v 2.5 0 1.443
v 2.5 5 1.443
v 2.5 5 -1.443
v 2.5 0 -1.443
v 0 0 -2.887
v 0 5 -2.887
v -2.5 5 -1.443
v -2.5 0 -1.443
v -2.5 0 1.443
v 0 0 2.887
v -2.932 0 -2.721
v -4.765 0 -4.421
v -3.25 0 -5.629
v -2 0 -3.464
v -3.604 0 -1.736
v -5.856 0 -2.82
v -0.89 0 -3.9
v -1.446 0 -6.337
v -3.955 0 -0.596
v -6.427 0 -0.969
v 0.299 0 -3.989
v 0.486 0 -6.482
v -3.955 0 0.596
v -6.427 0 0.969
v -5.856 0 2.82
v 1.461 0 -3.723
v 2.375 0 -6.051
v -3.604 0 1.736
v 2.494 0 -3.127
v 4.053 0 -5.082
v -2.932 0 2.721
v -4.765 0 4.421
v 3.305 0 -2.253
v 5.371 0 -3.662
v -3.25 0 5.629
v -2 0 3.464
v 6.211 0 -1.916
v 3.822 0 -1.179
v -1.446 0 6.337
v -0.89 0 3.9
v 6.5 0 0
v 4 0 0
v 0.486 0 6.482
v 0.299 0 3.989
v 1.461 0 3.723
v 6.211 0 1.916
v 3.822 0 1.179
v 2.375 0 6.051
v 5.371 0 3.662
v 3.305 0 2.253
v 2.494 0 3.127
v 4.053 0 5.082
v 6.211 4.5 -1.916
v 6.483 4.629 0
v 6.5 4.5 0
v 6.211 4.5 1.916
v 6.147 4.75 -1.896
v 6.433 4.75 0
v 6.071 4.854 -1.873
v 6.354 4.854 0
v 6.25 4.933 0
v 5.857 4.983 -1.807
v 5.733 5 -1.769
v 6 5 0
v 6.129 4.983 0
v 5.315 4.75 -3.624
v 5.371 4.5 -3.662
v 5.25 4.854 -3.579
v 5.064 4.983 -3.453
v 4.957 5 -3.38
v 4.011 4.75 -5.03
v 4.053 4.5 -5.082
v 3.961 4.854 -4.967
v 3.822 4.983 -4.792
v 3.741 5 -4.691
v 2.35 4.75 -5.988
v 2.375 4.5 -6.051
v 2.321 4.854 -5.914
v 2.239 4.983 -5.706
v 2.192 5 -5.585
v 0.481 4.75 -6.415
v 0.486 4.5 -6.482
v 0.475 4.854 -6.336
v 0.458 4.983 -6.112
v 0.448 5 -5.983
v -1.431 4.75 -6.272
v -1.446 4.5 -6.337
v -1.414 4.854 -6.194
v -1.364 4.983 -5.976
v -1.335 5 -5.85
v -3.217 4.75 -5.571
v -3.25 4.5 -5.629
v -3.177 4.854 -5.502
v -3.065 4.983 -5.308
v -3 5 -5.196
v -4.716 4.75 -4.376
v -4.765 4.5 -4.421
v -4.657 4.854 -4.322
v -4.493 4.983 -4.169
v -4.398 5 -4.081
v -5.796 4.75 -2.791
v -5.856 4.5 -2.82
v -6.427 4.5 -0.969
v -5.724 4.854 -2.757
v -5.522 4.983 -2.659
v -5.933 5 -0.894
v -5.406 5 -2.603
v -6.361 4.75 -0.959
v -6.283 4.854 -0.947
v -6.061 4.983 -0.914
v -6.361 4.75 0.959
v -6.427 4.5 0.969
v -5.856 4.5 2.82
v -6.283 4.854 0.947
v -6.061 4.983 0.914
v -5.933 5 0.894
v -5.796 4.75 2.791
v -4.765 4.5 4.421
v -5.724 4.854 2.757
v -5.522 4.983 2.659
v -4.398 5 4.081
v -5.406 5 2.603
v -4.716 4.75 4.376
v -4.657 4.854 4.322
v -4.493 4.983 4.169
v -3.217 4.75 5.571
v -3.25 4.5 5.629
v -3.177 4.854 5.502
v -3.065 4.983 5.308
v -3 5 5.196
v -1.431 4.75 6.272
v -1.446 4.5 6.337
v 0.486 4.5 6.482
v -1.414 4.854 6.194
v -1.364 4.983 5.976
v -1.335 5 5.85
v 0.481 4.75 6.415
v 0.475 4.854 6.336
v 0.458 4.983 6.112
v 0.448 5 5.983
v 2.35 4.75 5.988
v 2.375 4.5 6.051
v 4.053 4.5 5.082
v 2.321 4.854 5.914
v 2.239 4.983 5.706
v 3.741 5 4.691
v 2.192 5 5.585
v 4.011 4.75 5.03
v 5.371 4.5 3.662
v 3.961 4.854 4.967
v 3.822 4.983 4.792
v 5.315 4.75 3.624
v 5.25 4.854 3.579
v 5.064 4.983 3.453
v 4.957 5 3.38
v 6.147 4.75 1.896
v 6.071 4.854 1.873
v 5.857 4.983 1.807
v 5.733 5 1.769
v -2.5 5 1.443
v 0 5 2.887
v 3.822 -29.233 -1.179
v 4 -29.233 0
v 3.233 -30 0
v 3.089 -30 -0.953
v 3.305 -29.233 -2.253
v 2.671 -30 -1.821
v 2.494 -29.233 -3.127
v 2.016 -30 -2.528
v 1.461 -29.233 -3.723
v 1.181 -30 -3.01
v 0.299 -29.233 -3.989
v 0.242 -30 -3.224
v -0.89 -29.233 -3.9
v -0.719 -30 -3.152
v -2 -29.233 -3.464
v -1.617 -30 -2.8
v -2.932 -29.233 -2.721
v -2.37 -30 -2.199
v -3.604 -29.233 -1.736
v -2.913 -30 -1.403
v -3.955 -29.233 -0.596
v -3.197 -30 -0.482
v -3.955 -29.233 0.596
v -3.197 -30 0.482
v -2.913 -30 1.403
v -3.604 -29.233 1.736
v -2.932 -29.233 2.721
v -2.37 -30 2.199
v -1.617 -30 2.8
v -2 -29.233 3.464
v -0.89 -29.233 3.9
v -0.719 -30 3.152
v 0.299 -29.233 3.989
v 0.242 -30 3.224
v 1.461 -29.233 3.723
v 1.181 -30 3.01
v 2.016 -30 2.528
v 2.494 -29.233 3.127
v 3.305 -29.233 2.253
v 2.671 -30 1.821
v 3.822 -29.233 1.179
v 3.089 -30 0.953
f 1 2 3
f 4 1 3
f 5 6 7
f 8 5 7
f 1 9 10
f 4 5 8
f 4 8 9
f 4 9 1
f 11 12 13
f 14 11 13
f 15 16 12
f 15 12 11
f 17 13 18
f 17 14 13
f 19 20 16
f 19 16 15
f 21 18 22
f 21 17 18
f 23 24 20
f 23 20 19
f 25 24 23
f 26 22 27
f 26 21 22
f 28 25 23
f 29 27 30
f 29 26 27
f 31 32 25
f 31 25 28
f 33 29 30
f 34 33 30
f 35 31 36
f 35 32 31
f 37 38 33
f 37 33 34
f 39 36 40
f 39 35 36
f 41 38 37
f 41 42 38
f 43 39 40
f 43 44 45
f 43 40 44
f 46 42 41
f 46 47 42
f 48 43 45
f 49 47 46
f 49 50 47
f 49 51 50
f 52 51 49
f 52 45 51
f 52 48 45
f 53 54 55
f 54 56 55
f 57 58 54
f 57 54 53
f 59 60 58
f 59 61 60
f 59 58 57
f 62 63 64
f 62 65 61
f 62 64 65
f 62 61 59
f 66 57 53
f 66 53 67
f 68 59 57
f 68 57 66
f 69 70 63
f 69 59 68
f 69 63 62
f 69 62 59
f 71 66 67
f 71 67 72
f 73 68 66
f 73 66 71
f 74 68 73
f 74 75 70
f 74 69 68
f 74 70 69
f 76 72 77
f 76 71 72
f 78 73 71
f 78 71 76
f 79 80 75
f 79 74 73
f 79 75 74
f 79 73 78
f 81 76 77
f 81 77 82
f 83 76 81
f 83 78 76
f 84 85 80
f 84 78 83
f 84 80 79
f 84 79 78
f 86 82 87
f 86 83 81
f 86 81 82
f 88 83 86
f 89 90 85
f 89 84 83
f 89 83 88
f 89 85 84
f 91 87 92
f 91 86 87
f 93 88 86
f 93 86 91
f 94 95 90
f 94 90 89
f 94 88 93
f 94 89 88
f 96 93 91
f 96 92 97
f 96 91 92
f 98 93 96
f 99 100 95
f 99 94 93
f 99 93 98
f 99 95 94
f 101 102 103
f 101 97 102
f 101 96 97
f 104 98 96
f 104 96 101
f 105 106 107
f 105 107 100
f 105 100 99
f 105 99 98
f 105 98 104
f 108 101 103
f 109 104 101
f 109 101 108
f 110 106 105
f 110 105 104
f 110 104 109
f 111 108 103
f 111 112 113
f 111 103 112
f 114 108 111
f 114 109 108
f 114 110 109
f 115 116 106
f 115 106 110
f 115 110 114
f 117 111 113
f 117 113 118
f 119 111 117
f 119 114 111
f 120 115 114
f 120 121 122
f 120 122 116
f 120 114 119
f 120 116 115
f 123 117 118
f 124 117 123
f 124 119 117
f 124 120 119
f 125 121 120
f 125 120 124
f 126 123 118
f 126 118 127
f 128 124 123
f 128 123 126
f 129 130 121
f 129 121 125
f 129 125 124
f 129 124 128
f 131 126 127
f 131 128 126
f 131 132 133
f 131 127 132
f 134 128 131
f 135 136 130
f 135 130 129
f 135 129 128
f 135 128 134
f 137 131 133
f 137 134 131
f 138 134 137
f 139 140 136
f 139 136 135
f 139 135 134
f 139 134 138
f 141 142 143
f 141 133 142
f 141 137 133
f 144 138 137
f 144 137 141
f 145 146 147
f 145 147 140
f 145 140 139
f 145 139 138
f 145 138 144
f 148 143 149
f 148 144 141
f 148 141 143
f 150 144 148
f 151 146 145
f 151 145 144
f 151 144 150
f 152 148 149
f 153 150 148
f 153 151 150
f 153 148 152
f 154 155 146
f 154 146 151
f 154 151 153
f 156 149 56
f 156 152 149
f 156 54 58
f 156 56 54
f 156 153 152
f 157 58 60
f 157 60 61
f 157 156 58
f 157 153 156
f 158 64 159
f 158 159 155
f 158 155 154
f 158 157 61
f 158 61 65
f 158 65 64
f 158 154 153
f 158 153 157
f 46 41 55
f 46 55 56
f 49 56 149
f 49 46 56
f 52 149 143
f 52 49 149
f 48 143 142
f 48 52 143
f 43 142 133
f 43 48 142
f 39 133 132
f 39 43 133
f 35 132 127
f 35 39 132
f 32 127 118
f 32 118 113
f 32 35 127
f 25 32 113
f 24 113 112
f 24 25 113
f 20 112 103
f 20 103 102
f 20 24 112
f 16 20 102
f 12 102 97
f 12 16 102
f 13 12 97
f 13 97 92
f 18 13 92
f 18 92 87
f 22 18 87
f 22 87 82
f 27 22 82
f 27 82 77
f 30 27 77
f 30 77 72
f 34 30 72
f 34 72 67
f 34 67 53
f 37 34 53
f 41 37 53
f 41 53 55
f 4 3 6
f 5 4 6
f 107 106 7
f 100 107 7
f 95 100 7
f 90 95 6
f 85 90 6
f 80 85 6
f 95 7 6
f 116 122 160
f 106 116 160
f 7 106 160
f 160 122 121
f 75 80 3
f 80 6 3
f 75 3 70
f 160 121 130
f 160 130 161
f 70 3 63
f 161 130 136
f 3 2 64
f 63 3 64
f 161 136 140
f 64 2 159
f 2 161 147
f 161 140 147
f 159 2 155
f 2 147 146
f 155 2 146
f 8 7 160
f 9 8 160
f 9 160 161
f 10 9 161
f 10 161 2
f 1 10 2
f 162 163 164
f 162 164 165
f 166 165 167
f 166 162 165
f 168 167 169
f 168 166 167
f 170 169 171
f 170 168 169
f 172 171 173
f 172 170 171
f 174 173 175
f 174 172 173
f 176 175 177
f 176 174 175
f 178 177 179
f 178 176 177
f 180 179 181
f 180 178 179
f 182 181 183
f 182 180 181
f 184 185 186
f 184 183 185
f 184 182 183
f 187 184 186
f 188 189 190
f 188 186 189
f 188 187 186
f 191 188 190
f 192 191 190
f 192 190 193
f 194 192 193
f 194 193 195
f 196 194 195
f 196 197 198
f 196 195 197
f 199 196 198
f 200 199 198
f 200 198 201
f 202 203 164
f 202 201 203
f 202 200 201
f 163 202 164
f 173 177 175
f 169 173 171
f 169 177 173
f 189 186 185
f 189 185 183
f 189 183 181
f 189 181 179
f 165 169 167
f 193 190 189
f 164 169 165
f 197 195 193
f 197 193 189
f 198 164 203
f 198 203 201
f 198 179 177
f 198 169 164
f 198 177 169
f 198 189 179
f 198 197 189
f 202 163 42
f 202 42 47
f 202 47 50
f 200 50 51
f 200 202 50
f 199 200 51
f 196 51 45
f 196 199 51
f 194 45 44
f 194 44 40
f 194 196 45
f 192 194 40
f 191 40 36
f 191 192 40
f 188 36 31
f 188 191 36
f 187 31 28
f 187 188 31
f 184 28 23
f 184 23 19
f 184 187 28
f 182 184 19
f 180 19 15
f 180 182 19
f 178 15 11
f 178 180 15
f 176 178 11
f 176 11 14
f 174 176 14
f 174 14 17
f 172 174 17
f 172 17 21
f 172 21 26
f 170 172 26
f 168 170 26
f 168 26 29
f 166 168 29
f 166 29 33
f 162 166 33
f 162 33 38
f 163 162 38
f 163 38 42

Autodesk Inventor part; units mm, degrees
ref_plane "Deaktiviert_NICHT_mehrverwenden_Zyl__Schraube_DIN_EN_ISO_4762_XY" through (0, 0, 0) normal (0, 1, 0) x (1, 0, 0)
ref_plane "Deaktiviert_NICHT_mehrverwenden_Zyl__Schraube_DIN_EN_ISO_4762_YZ" through (0, 0, 0) normal (1, 0, 0) x (0, 0, -1)
ref_plane "Deaktiviert_NICHT_mehrverwenden_Zyl__Schraube_DIN_EN_ISO_4762_ZX" through (0, 0, 0) normal (0, 0, -1) x (0, 1, 0)
sketch "Skizze_1" plane through (0, 0, 0) normal (0, 0, 1) x (1, 0, 0)
  line L0 (0, -30) -> (0, 0)
  line L1 (0, 0) -> (4, 0)
  line L2 (4, 0) -> (4, -29.233)
  line L3 (4, -29.233) -> (3.233, -30)
  line L4 (3.233, -30) -> (0, -30)
  line L5 (0, -30) -> (0, 0)
revolve "Revolution1" add sketch "Skizze_1" angle 360 about axis through (0, -30, 0) along (0, -1, 0)
thread "Thread1" size "M8x1.25" class "6g" standard "ISO Metric profile" length 29 offset 1
sketch "Skizze_2" plane through (0, 0, 0) normal (0, 0, 1) x (1, 0, 0)
  line L0 (0, 0) -> (0, 5)
  line L1 (0, 5) -> (6, 5)
  arc A0 (6.5, 4.5) -> (6, 5) centre (6, 4.5) ccw
  line L2 (6.5, 4.5) -> (6.5, 0)
  line L3 (6.5, 0) -> (0, 0)
  line L4 (0, 0) -> (0, 5)
revolve "Revolution2" add sketch "Skizze_2" angle 360 about axis through (0, 0, 0) along (0, -1, 0)
sketch "Skizze_3" plane through (0, 5, 0) normal (0, 1, 0) x (1, 0, 0)
  line L0 (-2.5, -1.4434) -> (0, -2.8868)
  line L1 (0, -2.8868) -> (2.5, -1.4434)
  line L2 (2.5, -1.4434) -> (2.5, 1.4434)
  line L3 (2.5, 1.4434) -> (0, 2.8868)
  line L4 (0, 2.8868) -> (-2.5, 1.4434)
  line L5 (-2.5, 1.4434) -> (-2.5, -1.4434)
extrude "Extrusion1" cut sketch "Skizze_3" against normal blind 5
ref_plane "EP_XY" through (0, 0, 0) normal (0, 1, 0) x (1, 0, 0)
ref_plane "EP_YZ" through (0, 0, 0) normal (1, 0, 0) x (0, 0, -1)
ref_plane "EP_ZX" through (0, 0, 0) normal (0, 0, -1) x (0, 1, 0)
ref_plane "EP_Schraube_XY" through (0, 0, 0) normal (0, 1, 0) x (1, 0, 0)
ref_plane "EP_Schraube_YZ" through (0, 0, 0) normal (1, 0, 0) x (0, 0, -1)
ref_plane "EP_Schraube_ZX" through (0, 0, 0) normal (0, 0, -1) x (0, 1, 0)
properties part number "Zyl.Schr-M8x30_Stahl_X094960"
